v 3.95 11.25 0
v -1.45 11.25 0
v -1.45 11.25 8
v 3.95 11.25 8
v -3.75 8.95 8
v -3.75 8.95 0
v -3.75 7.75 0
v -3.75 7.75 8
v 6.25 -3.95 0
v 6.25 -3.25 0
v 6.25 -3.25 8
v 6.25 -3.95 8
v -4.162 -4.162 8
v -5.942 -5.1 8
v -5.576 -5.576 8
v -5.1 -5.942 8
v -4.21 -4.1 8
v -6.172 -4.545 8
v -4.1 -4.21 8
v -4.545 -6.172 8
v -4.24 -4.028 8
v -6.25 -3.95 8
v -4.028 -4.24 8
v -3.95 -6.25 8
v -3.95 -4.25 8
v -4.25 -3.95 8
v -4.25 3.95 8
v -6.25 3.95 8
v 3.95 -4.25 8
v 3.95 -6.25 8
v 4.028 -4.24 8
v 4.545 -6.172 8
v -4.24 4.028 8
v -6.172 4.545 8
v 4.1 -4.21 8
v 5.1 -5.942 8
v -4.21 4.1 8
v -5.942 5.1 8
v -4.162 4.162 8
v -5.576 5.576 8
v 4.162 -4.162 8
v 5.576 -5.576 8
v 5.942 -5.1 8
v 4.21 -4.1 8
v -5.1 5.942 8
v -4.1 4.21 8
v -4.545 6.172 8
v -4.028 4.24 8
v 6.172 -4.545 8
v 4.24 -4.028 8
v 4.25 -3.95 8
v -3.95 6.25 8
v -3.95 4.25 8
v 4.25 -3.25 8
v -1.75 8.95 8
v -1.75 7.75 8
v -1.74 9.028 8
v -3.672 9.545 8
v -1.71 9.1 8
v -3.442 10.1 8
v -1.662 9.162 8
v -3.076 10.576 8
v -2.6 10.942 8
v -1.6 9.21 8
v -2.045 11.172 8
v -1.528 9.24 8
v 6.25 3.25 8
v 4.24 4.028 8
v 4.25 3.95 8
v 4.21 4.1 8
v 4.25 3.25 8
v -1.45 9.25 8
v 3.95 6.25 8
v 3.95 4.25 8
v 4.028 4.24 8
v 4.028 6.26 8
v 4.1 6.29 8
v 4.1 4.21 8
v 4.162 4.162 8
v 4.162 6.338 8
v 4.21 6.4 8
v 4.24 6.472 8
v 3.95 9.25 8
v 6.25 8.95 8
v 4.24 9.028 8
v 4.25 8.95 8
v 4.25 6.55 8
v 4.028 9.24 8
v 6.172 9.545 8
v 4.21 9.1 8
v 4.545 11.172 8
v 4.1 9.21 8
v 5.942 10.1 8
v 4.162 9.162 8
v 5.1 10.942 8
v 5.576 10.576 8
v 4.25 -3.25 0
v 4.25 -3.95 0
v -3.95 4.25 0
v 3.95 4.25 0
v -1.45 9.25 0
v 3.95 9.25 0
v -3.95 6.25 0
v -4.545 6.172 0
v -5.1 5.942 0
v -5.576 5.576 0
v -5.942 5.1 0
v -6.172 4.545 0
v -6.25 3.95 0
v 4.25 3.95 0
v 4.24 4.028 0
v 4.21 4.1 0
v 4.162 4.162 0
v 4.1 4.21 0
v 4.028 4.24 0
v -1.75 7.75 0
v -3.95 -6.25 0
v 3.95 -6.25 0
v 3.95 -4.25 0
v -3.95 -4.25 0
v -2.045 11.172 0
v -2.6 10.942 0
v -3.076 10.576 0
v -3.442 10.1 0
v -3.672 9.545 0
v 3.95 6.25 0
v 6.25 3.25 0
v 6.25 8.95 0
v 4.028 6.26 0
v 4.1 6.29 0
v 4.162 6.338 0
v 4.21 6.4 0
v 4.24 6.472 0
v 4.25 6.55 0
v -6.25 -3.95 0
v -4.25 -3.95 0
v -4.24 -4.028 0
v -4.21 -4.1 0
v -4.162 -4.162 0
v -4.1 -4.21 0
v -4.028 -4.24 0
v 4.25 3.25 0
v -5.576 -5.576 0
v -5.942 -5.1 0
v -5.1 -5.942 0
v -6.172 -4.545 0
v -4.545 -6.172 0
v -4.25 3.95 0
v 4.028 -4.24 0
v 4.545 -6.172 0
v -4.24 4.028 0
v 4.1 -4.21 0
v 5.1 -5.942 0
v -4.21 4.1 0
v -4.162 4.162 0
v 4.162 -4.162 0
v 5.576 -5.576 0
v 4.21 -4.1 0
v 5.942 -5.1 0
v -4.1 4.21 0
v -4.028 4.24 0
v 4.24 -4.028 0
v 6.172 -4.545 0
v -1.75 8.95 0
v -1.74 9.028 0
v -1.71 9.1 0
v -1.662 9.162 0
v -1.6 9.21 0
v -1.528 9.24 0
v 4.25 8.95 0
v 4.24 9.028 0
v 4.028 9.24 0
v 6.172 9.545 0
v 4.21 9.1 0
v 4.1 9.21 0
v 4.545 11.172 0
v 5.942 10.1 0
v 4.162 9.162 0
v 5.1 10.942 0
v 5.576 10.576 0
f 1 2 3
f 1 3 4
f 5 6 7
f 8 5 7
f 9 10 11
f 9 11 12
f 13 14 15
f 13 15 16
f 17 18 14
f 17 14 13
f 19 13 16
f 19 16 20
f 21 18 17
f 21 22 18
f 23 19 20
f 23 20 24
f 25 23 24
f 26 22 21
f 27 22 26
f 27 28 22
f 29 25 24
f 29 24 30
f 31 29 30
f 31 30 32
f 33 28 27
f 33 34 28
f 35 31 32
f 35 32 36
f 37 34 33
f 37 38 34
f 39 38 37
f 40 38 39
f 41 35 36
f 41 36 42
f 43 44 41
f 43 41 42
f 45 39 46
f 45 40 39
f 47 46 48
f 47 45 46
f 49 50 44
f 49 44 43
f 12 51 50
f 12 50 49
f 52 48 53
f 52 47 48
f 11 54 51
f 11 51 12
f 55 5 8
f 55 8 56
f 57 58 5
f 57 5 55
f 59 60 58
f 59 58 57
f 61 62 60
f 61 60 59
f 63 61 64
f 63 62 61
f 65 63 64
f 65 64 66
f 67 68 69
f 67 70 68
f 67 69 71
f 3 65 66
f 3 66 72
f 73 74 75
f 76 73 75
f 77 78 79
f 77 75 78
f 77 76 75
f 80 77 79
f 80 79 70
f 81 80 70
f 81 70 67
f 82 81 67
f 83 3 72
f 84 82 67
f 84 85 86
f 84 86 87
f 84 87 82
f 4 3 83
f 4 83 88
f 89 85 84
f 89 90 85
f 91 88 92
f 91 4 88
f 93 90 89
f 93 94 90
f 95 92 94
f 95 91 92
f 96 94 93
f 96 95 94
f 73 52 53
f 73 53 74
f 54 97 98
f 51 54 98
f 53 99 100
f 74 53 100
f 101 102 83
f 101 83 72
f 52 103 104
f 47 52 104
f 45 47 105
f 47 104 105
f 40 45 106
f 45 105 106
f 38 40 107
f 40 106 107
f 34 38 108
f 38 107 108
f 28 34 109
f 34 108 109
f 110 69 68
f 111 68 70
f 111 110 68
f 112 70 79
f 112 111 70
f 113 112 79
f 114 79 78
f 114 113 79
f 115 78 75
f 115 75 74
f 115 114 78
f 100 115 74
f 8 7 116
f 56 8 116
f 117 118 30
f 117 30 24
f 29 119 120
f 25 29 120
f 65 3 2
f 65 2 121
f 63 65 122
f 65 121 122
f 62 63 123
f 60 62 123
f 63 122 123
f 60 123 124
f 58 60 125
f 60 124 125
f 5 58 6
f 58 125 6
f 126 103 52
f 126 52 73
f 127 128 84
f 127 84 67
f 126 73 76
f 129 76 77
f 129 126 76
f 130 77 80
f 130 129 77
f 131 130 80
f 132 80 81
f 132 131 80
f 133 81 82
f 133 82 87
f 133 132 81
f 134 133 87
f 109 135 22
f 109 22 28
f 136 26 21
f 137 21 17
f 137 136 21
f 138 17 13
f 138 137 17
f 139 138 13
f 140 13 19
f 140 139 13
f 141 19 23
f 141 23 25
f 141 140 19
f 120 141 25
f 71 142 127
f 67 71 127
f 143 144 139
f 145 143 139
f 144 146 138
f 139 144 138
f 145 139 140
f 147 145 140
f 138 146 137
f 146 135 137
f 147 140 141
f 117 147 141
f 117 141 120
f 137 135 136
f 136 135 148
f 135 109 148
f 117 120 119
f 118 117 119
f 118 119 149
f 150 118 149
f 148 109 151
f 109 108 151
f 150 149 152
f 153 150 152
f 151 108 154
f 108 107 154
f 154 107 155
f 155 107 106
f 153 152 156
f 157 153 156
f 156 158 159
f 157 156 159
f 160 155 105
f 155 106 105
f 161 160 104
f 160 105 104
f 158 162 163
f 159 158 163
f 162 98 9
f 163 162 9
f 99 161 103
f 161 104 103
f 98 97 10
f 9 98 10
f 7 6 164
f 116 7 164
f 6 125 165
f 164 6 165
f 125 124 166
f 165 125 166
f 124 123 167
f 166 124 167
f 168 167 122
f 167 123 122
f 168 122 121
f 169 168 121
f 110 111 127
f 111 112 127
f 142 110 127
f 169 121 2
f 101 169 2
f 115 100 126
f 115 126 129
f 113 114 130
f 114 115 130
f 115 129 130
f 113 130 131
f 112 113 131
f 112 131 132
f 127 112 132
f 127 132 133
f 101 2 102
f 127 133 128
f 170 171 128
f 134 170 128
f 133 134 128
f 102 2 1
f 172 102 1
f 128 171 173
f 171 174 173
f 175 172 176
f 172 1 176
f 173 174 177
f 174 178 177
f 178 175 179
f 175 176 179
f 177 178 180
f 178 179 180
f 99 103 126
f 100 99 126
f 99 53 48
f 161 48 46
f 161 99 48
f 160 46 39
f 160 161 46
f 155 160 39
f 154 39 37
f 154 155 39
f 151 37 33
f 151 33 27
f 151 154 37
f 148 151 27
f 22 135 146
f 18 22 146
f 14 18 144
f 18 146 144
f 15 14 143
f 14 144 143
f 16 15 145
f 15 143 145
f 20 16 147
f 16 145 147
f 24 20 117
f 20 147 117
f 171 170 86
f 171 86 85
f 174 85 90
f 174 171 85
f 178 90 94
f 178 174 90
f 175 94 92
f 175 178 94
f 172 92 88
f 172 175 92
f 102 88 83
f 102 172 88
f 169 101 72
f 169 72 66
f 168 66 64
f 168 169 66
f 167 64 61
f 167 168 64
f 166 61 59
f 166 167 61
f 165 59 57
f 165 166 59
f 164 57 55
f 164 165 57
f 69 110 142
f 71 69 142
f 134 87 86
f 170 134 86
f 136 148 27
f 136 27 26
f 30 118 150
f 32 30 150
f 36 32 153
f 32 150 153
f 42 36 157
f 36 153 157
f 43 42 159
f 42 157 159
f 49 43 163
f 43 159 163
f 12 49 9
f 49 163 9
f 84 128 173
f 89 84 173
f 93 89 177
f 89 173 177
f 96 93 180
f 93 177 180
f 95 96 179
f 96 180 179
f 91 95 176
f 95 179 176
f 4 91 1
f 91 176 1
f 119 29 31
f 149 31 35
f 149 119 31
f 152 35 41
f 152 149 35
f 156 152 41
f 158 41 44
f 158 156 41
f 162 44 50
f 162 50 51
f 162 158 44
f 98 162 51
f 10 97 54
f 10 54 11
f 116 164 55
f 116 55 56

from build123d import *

# Parameters (mm, degrees)
PAD_DEPTH = 8


with BuildPart() as part:
    # Sketch → Pad (new body)
    with BuildSketch(Plane.XY):
        with BuildLine():
            Line((4.25, -3.25), (4.25, -3.95))
            ThreePointArc((3.95, -4.25), (4.162132, -4.162132), (4.25, -3.95))
            Line((3.95, -4.25), (-3.95, -4.25))
            ThreePointArc((-4.25, -3.95), (-4.162132, -4.162132), (-3.95, -4.25))
            Line((-4.25, 3.95), (-4.25, -3.95))
            ThreePointArc((-3.95, 4.25), (-4.162132, 4.162132), (-4.25, 3.95))
            Line((-3.95, 4.25), (3.95, 4.25))
            ThreePointArc((4.25, 3.95), (4.162132, 4.162132), (3.95, 4.25))
            Line((4.25, 3.95), (4.25, 3.25))
            Line((4.25, 3.25), (6.25, 3.25))
            Line((6.25, 6.25), (6.25, 3.25))
            Line((6.25, 8.95), (6.25, 6.25))
            ThreePointArc((6.25, 8.95), (5.576346, 10.576346), (3.95, 11.25))
            Line((-1.45, 11.25), (3.95, 11.25))
            ThreePointArc((-1.45, 11.25), (-3.076346, 10.576346), (-3.75, 8.95))
            Line((-3.75, 8.95), (-3.75, 7.75))
            Line((-3.75, 7.75), (-1.75, 7.75))
            Line((-1.75, 8.95), (-1.75, 7.75))
            ThreePointArc((-1.45, 9.25), (-1.662132, 9.162132), (-1.75, 8.95))
            Line((3.95, 9.25), (-1.45, 9.25))
            ThreePointArc((4.25, 8.95), (4.162132, 9.162132), (3.95, 9.25))
            Line((4.25, 6.55), (4.25, 8.95))
            ThreePointArc((3.95, 6.25), (4.162132, 6.337868), (4.25, 6.55))
            Line((-3.95, 6.25), (3.95, 6.25))
            ThreePointArc((-3.95, 6.25), (-5.576346, 5.576346), (-6.25, 3.95))
            Line((-6.25, -3.95), (-6.25, 3.95))
            ThreePointArc((-6.25, -3.95), (-5.576346, -5.576346), (-3.95, -6.25))
            Line((3.95, -6.25), (-3.95, -6.25))
            ThreePointArc((3.95, -6.25), (5.576346, -5.576346), (6.25, -3.95))
            Line((6.25, -3.25), (6.25, -3.95))
            Line((4.25, -3.25), (6.25, -3.25))
        make_face()
    extrude(amount=PAD_DEPTH)


solid = part.part
